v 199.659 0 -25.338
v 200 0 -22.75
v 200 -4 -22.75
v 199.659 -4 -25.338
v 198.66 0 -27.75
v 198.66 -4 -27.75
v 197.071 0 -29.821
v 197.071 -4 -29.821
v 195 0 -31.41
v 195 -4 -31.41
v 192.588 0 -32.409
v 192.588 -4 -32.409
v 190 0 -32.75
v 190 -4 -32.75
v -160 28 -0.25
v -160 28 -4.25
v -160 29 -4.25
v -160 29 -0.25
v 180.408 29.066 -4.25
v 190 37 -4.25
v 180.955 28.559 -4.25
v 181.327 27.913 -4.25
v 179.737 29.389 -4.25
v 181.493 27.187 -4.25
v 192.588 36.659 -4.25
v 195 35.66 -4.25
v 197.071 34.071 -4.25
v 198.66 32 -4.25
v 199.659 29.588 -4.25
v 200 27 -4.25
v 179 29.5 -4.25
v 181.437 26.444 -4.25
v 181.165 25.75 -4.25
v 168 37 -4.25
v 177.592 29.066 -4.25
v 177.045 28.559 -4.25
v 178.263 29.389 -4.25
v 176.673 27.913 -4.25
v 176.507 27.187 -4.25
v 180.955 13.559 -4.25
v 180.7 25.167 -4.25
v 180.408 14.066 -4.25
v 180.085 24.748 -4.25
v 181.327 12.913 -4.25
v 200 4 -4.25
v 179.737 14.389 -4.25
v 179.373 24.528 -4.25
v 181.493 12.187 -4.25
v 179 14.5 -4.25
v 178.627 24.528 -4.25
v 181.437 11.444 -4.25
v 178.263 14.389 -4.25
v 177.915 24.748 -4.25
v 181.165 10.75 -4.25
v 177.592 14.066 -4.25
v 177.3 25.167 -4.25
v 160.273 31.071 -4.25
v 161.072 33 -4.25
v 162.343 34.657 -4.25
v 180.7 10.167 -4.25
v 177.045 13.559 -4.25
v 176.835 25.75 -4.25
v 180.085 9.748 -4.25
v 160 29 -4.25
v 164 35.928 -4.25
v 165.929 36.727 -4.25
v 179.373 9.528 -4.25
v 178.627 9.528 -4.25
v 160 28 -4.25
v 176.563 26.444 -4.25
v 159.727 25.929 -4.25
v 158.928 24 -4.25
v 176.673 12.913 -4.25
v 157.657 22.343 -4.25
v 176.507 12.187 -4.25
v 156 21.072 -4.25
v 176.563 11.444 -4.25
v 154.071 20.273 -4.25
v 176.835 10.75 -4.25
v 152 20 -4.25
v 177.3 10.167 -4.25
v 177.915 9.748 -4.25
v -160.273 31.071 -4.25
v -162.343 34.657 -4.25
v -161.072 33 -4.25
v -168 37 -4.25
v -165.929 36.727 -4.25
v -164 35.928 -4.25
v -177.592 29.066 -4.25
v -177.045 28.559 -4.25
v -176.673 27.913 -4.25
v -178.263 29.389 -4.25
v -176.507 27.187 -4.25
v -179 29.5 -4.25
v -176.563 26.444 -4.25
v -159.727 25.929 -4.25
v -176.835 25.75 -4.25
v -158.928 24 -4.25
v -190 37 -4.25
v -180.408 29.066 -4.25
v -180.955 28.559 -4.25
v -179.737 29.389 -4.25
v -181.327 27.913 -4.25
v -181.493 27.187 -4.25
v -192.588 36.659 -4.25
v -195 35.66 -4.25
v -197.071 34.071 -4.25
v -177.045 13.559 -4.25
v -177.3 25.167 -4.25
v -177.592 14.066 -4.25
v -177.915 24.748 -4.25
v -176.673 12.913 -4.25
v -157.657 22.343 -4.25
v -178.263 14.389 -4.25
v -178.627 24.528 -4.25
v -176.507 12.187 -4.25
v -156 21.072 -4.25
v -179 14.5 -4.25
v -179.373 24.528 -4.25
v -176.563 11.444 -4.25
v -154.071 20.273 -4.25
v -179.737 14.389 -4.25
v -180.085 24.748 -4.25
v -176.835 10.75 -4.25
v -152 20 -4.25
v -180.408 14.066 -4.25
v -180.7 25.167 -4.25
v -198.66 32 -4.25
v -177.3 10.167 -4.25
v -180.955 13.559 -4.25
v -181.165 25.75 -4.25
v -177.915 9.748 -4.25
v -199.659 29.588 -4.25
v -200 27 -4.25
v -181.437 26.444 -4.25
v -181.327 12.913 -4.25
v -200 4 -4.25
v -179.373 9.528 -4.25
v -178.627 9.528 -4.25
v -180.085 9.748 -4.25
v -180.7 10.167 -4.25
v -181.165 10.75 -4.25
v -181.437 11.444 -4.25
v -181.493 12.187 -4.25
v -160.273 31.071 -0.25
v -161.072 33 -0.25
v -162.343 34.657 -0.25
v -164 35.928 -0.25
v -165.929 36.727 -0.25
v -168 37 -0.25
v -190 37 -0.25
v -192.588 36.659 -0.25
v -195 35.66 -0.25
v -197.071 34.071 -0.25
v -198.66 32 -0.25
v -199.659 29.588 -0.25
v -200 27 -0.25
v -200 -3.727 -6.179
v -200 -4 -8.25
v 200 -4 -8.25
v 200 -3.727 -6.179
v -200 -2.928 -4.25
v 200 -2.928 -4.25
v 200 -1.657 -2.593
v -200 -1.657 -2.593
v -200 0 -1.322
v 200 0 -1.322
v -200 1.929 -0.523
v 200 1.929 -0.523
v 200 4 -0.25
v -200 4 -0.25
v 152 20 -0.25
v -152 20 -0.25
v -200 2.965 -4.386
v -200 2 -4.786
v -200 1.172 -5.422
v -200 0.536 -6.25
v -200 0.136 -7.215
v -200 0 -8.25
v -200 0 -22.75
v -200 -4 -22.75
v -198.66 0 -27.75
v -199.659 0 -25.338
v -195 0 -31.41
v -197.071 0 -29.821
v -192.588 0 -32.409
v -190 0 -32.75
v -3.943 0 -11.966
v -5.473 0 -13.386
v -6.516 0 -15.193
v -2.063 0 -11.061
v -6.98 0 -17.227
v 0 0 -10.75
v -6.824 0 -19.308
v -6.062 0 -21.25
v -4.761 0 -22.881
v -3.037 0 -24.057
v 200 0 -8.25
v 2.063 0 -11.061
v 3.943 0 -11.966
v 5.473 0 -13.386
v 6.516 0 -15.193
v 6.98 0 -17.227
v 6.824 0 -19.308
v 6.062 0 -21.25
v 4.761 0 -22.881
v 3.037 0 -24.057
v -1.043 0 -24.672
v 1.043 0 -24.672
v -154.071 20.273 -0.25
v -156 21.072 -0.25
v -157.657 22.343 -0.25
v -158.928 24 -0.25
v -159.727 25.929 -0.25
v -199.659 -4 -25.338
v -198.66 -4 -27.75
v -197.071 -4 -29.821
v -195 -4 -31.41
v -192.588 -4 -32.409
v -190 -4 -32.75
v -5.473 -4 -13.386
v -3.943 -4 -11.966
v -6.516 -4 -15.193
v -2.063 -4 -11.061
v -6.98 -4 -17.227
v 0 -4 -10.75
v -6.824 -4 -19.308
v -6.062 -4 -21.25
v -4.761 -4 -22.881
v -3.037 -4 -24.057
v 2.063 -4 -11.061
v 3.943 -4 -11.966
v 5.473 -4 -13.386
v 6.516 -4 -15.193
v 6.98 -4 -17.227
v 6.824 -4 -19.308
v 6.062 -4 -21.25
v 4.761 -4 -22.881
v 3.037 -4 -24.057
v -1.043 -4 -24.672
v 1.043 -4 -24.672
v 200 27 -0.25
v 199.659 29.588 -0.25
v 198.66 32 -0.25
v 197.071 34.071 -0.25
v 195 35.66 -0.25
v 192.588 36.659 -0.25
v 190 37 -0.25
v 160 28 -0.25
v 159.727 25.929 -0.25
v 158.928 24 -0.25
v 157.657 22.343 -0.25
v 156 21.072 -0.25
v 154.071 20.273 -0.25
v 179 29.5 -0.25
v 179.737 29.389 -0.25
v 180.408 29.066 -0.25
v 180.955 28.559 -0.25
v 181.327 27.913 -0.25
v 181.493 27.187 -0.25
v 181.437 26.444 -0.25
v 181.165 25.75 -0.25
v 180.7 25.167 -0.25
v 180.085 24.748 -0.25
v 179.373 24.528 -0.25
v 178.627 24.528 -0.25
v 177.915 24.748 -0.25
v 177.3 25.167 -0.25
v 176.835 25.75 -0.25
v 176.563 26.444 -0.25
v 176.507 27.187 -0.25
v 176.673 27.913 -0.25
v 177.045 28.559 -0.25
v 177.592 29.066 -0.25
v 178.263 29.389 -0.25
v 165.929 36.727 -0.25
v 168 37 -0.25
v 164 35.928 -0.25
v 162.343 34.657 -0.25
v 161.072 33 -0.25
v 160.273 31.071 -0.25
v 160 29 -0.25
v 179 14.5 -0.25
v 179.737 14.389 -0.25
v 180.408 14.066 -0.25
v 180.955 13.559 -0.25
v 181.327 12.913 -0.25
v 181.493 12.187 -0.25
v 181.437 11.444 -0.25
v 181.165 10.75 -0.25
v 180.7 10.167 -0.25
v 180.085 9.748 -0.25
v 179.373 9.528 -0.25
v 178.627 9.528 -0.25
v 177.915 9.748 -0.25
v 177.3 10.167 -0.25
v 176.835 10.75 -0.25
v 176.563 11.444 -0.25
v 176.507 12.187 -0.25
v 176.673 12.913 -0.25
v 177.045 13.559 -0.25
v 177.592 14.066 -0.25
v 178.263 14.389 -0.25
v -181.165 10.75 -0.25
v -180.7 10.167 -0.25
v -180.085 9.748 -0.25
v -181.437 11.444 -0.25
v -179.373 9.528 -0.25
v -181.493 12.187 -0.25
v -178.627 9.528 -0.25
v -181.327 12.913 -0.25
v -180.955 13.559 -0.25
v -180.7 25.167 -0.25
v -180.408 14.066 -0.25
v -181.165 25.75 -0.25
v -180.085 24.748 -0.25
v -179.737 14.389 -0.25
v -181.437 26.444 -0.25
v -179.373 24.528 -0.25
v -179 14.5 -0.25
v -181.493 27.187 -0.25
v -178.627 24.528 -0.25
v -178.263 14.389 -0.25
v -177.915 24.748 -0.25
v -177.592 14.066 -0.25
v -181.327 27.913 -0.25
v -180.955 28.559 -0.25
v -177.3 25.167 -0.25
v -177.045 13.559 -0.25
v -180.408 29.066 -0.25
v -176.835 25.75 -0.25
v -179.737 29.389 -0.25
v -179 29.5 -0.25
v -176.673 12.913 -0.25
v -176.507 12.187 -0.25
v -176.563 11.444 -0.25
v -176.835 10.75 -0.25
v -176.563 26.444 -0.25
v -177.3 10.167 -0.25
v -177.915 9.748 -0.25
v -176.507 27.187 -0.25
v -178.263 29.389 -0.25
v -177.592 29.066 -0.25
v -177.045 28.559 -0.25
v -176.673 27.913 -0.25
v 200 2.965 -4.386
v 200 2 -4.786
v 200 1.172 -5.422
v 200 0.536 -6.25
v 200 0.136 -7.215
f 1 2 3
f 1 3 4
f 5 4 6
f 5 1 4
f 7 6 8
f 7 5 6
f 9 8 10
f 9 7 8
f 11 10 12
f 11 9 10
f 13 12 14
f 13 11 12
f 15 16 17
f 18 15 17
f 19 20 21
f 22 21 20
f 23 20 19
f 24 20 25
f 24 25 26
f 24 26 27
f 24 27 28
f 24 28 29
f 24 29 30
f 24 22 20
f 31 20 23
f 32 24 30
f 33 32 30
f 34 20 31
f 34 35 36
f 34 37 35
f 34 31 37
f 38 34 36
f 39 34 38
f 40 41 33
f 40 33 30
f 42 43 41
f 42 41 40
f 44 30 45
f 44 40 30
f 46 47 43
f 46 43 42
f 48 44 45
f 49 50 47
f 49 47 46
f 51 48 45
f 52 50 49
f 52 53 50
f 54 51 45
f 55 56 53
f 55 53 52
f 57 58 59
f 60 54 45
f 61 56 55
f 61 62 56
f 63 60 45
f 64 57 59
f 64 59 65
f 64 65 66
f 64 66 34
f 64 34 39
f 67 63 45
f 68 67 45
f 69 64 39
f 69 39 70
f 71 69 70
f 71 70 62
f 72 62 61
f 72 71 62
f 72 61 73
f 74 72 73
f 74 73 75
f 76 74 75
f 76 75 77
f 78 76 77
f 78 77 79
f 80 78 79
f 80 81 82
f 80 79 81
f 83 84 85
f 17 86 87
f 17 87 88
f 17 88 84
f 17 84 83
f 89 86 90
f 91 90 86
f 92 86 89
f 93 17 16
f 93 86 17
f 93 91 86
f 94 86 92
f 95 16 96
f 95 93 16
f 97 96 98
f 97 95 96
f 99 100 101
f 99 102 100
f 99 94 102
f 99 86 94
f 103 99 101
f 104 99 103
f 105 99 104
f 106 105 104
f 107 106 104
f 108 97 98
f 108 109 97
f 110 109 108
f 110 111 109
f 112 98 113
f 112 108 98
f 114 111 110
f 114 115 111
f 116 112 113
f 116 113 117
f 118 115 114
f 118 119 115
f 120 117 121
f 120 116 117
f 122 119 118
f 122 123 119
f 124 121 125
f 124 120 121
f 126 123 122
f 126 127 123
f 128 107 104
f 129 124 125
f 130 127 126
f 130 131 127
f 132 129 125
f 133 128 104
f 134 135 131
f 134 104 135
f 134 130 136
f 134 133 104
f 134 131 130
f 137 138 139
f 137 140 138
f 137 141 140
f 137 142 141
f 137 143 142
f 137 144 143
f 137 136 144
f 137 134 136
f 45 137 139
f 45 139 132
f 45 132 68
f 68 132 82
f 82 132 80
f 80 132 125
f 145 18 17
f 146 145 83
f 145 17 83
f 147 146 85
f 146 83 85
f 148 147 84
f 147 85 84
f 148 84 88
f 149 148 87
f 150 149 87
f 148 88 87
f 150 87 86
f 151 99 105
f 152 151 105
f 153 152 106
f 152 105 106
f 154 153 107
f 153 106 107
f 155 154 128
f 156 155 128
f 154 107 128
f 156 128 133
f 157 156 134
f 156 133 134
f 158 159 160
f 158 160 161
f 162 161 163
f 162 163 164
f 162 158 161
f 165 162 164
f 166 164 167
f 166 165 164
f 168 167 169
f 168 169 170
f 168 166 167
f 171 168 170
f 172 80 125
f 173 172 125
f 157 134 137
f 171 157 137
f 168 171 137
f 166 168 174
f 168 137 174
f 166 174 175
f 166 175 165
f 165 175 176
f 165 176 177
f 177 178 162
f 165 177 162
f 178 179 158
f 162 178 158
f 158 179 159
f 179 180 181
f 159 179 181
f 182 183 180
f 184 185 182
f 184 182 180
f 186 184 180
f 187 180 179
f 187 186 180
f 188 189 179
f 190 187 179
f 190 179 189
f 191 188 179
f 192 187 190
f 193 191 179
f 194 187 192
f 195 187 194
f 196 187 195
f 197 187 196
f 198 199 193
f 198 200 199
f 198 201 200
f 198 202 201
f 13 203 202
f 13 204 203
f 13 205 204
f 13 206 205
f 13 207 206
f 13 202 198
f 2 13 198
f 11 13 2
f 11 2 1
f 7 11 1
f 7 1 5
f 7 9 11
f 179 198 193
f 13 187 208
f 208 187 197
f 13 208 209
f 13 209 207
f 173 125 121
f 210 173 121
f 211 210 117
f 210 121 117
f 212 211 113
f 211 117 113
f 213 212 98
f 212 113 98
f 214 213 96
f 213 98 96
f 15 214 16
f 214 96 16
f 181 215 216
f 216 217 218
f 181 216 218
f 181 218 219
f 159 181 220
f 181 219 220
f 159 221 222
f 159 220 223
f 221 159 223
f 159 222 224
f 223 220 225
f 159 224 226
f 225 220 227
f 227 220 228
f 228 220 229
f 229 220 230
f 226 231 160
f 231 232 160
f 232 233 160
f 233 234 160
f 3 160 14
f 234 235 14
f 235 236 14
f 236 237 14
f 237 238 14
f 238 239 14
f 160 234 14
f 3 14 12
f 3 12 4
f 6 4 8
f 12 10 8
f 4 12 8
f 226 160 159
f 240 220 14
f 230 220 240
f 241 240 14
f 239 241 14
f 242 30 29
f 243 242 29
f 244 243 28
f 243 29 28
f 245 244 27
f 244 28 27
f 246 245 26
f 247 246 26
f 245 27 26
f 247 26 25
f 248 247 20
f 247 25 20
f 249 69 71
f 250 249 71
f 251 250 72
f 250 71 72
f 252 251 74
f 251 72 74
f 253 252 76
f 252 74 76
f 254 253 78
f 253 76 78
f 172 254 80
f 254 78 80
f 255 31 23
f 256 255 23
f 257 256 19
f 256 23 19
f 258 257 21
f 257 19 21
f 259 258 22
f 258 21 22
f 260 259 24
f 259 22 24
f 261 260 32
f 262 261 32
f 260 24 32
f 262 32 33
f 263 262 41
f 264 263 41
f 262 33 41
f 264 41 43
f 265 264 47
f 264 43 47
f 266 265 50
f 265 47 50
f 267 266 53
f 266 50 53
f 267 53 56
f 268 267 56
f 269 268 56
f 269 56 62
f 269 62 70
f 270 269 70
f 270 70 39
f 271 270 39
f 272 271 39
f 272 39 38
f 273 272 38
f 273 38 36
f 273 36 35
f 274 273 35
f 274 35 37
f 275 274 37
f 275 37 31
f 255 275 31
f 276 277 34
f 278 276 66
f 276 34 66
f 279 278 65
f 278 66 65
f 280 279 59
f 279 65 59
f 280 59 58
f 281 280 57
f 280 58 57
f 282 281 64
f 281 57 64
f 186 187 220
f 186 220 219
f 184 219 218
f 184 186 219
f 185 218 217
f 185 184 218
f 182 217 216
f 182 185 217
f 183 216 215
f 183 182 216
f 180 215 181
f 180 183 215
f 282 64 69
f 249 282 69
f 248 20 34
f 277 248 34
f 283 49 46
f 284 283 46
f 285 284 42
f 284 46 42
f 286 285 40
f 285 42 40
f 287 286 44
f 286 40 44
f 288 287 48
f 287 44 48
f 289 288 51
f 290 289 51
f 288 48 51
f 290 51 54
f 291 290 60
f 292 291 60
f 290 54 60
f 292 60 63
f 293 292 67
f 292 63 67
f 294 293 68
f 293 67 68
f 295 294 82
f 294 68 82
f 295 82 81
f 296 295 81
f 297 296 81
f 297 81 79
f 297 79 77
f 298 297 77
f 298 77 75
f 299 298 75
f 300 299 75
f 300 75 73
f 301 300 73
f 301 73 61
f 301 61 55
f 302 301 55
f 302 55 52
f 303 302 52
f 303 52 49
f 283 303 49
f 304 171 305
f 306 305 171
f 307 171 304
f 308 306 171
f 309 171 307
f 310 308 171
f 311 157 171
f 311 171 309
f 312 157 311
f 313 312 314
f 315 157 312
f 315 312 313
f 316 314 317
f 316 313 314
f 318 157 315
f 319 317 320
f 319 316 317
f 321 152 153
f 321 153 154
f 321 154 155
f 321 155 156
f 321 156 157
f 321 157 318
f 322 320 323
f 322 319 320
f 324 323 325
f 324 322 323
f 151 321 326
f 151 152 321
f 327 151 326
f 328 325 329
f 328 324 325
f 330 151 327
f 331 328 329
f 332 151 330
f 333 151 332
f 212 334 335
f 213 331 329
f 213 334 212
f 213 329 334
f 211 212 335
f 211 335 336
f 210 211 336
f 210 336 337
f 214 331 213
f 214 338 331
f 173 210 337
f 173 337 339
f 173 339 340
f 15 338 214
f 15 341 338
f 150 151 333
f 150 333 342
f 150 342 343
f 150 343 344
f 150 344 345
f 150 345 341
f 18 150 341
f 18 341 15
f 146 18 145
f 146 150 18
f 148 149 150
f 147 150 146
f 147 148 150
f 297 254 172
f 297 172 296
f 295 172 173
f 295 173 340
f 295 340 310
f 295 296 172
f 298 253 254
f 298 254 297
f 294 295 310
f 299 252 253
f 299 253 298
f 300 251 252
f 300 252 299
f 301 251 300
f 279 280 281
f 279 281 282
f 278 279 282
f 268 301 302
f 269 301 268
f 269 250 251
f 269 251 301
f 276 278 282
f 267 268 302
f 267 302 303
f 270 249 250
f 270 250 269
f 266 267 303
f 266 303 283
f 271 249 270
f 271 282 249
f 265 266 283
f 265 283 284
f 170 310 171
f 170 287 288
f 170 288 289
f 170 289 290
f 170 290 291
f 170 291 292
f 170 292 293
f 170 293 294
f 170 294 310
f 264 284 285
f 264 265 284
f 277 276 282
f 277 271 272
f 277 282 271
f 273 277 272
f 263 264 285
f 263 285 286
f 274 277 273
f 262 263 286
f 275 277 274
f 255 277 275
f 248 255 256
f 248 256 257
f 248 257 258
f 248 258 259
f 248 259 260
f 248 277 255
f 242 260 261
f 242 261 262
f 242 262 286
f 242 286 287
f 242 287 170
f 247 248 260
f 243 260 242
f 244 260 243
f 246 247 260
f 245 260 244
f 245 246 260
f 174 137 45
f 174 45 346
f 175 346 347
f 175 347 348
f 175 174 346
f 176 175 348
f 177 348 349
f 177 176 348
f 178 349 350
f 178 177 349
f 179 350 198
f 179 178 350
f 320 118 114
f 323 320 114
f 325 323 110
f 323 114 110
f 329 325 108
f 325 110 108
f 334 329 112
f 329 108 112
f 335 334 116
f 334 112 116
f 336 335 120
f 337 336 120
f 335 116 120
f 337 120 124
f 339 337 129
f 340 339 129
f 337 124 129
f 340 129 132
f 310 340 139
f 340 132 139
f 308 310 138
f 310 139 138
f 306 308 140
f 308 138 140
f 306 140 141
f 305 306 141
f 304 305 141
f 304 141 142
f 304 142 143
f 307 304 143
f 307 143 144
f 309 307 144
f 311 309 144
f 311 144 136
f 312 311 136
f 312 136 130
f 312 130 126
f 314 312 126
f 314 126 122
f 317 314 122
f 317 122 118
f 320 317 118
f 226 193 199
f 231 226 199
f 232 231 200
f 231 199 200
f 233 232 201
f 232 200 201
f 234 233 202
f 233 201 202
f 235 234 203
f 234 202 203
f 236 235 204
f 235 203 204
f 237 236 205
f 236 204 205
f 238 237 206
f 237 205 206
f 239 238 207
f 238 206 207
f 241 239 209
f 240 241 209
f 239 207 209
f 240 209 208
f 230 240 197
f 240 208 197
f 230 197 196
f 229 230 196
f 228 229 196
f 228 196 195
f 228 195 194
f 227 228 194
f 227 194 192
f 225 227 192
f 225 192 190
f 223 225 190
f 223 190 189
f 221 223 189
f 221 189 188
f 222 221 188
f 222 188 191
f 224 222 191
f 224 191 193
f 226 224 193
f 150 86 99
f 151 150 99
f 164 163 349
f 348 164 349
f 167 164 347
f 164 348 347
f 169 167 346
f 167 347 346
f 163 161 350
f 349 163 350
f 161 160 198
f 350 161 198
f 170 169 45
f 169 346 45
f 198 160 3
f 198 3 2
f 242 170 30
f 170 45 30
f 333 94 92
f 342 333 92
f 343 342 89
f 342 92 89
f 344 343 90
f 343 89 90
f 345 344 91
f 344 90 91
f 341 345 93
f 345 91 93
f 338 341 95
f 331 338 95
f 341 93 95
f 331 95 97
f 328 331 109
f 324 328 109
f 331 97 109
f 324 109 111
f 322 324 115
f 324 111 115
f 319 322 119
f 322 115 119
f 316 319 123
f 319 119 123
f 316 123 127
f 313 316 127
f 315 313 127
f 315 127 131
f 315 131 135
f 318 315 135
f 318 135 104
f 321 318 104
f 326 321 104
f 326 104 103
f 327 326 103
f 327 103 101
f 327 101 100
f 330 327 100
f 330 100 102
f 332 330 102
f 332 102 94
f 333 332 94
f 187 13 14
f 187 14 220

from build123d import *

# Parameters (mm, degrees)
BRIDA_BASE1_DEPTH             = 4
PLIEGUE_START                 = -1.07192
PLIEGUE_CROQUIZADO1_OUTLINE_W = 400
PLIEGUE_CROQUIZADO1_OUTLINE_H = 4
PLIEGUE_CROQUIZADO1_DEPTH     = 33.82192
PLIEGUE_START_2               = -4.25
PLIEGUE_CROQUIZADO1_2_DEPTH   = 0.02192
PLIEGUE_START_3               = -8.25
PLIEGUE_CROQUIZADO1_3_DEPTH   = 8
PLIEGUE_START_4               = -200
PLIEGUE_CROQUIZADO1_4_DEPTH   = 400
CROQUIS8_R                    = 7
CORTAR_EXTRUIR2_DEPTH         = 10
CORTAR_EXTRUIR3_REACH         = 207.381
CROQUIS9_R                    = 2.5


with BuildPart() as part:
    # Brida base1: sheet metal written as solids
    # Croquis1 → Brida base1 (new body)
    with BuildSketch(Plane(origin=(0, 0, 0), x_dir=(1, 0, 0), z_dir=(0, 1, 0))):
        with BuildLine():
            Line((168, -32.75), (190, -32.75))
            ThreePointArc((190, -32.75), (197.071067812, -29.821067812), (200, -22.75))
            Line((200, -22.75), (200, 22.75))
            ThreePointArc((200, 22.75), (197.071067812, 29.821067812), (190, 32.75))
            Line((190, 32.75), (-190, 32.75))
            ThreePointArc((-190, 32.75), (-197.071067812, 29.821067812), (-200, 22.75))
            Line((-200, 22.75), (-200, -22.75))
            ThreePointArc((-200, -22.75), (-197.071067812, -29.821067812), (-190, -32.75))
            Line((-190, -32.75), (-168, -32.75))
            ThreePointArc((-168, -32.75), (-162.343145751, -30.406854249), (-160, -24.75))
            Line((-160, -24.75), (-160, -23.75))
            ThreePointArc((-160, -23.75), (-157.656854249, -18.093145751), (-152, -15.75))
            Line((-152, -15.75), (152, -15.75))
            ThreePointArc((152, -15.75), (157.656854249, -18.093145751), (160, -23.75))
            Line((160, -23.75), (160, -24.75))
            ThreePointArc((160, -24.75), (162.343145751, -30.406854249), (168, -32.75))
        make_face()
    extrude(amount=-BRIDA_BASE1_DEPTH)

    # Pliegue croquizado1: read off the stored shape, not the designer's step
    # Pliegue croquizado1 outline → Pliegue croquizado1 (cut)
    with BuildSketch(Plane.XY.offset(PLIEGUE_START)):
        with Locations((0, -2)):
            Rectangle(PLIEGUE_CROQUIZADO1_OUTLINE_W, PLIEGUE_CROQUIZADO1_OUTLINE_H)
    extrude(amount=PLIEGUE_CROQUIZADO1_DEPTH, mode=Mode.SUBTRACT)

    # Pliegue croquizado1 2 outline → Pliegue croquizado1 2 (add)
    with BuildSketch(Plane.XY.offset(PLIEGUE_START_2)):
        with BuildLine():
            ThreePointArc((-190, 36.999999998), (-197.071067812, 34.07106781), (-200, 26.999999998))
            Line((-200, 26.999999998), (-200, 0))
            Line((-200, 0), (200, 0))
            Line((200, 0), (200, 26.999999998))
            ThreePointArc((200, 26.999999998), (197.071067812, 34.07106781), (190, 36.999999998))
            Line((190, 36.999999998), (168, 36.999999998))
            ThreePointArc((168, 36.999999998), (162.343145751, 34.656854247), (160, 28.999999998))
            Line((160, 28.999999998), (160, 27.999999998))
            ThreePointArc((160, 27.999999998), (157.656854249, 22.343145749), (152, 19.999999998))
            Line((152, 19.999999998), (-152, 19.999999998))
            ThreePointArc((-152, 19.999999998), (-157.656854249, 22.343145749), (-160, 27.999999998))
            Line((-160, 27.999999998), (-160, 28.999999998))
            ThreePointArc((-160, 28.999999998), (-162.343145751, 34.656854248), (-168, 36.999999998))
            Line((-168, 36.999999998), (-190, 36.999999998))
        make_face()
    extrude(amount=PLIEGUE_CROQUIZADO1_2_DEPTH)

    # Pliegue croquizado1 3 outline → Pliegue croquizado1 3 (add)
    with BuildSketch(Plane.XY.offset(PLIEGUE_START_3)):
        with BuildLine():
            ThreePointArc((-190, 36.999999998), (-197.071067812, 34.07106781), (-200, 26.999999998))
            Line((-200, 26.999999998), (-200, 0))
            Line((-200, 0), (200, 0))
            Line((200, 0), (200, 26.999999998))
            ThreePointArc((200, 26.999999998), (197.071067812, 34.07106781), (190, 36.999999998))
            Line((190, 36.999999998), (168, 36.999999998))
            ThreePointArc((168, 36.999999998), (162.343145751, 34.656854247), (160, 28.999999998))
            Line((160, 28.999999998), (160, 27.999999998))
            ThreePointArc((160, 27.999999998), (157.656854249, 22.343145749), (152, 19.999999998))
            Line((152, 19.999999998), (-152, 19.999999998))
            ThreePointArc((-152, 19.999999998), (-157.656854249, 22.343145749), (-160, 27.999999998))
            Line((-160, 27.999999998), (-160, 28.999999998))
            ThreePointArc((-160, 28.999999998), (-162.343145751, 34.656854248), (-168, 36.999999998))
            Line((-168, 36.999999998), (-190, 36.999999998))
        make_face()
    extrude(amount=PLIEGUE_CROQUIZADO1_3_DEPTH)

    # Pliegue croquizado1 4 outline → Pliegue croquizado1 4 (cut)
    with BuildSketch(Plane.YZ.offset(PLIEGUE_START_4)):
        with BuildLine():
            ThreePointArc((-4, -8.25), (-1.656854249, -2.593145751), (4, -0.25))
            Line((4, -0.25), (0, -0.25))
            Line((0, -0.25), (0, -1.07192))
            Line((0, -1.07192), (-4, -1.07192))
            Line((-4, -1.07192), (-4, -8.25))
        make_face()
        with BuildLine():
            ThreePointArc((4, -4.25), (1.171572875, -5.421572875), (0, -8.25))
            Line((0, -8.25), (36.999999998, -8.25))
            Line((36.999999998, -8.25), (36.999999998, -4.25))
            Line((36.999999998, -4.25), (4, -4.25))
        make_face()
    extrude(amount=PLIEGUE_CROQUIZADO1_4_DEPTH, mode=Mode.SUBTRACT)

    # Croquis8 → Cortar-Extruir2 (cut)
    with BuildSketch(Plane(origin=(0, 0, 0), x_dir=(1, 0, 0), z_dir=(0, 1, 0))):
        with Locations(Location((0, 17.75, 0), (0, 0, 270))):
            Circle(CROQUIS8_R)
    extrude(amount=-CORTAR_EXTRUIR2_DEPTH, mode=Mode.SUBTRACT)

    # Croquis9 → Cortar-Extruir3 (cut, up to next)
    with BuildSketch(Plane(origin=(0, 0, -4.25), x_dir=(-1, 0, 0), z_dir=(0, 0, -1)), mode=Mode.PRIVATE) as cortar_extruir3_sk1:
        with Locations(Location((179, 11.999999998, 0), (0, 0, 90))):
            Circle(CROQUIS9_R)
    cortar_extruir3_tool1 = extrude(cortar_extruir3_sk1.sketch, amount=-CORTAR_EXTRUIR3_REACH, mode=Mode.PRIVATE) & part.part
    # Croquis9 → Cortar-Extruir3 (cut, up to next)
    with BuildSketch(Plane(origin=(0, 0, -4.25), x_dir=(-1, 0, 0), z_dir=(0, 0, -1)), mode=Mode.PRIVATE) as cortar_extruir3_sk2:
        with Locations(Location((179, 26.999999998, 0), (0, 0, 90))):
            Circle(CROQUIS9_R)
    cortar_extruir3_tool2 = extrude(cortar_extruir3_sk2.sketch, amount=-CORTAR_EXTRUIR3_REACH, mode=Mode.PRIVATE) & part.part
    # Croquis9 → Cortar-Extruir3 (cut, up to next)
    with BuildSketch(Plane(origin=(0, 0, -4.25), x_dir=(-1, 0, 0), z_dir=(0, 0, -1)), mode=Mode.PRIVATE) as cortar_extruir3_sk3:
        with Locations(Location((-179, 26.999999998, 0), (0, 0, 90))):
            Circle(CROQUIS9_R)
    cortar_extruir3_tool3 = extrude(cortar_extruir3_sk3.sketch, amount=-CORTAR_EXTRUIR3_REACH, mode=Mode.PRIVATE) & part.part
    # Croquis9 → Cortar-Extruir3 (cut, up to next)
    with BuildSketch(Plane(origin=(0, 0, -4.25), x_dir=(-1, 0, 0), z_dir=(0, 0, -1)), mode=Mode.PRIVATE) as cortar_extruir3_sk4:
        with Locations(Location((-179, 11.999999998, 0), (0, 0, 90))):
            Circle(CROQUIS9_R)
    cortar_extruir3_tool4 = extrude(cortar_extruir3_sk4.sketch, amount=-CORTAR_EXTRUIR3_REACH, mode=Mode.PRIVATE) & part.part
    add(cortar_extruir3_tool1.solids().sort_by_distance((-179, 12, -4.25))[0], mode=Mode.SUBTRACT)
    add(cortar_extruir3_tool2.solids().sort_by_distance((-179, 27, -4.25))[0], mode=Mode.SUBTRACT)
    add(cortar_extruir3_tool3.solids().sort_by_distance((179, 27, -4.25))[0], mode=Mode.SUBTRACT)
    add(cortar_extruir3_tool4.solids().sort_by_distance((179, 12, -4.25))[0], mode=Mode.SUBTRACT)


solid = part.part
